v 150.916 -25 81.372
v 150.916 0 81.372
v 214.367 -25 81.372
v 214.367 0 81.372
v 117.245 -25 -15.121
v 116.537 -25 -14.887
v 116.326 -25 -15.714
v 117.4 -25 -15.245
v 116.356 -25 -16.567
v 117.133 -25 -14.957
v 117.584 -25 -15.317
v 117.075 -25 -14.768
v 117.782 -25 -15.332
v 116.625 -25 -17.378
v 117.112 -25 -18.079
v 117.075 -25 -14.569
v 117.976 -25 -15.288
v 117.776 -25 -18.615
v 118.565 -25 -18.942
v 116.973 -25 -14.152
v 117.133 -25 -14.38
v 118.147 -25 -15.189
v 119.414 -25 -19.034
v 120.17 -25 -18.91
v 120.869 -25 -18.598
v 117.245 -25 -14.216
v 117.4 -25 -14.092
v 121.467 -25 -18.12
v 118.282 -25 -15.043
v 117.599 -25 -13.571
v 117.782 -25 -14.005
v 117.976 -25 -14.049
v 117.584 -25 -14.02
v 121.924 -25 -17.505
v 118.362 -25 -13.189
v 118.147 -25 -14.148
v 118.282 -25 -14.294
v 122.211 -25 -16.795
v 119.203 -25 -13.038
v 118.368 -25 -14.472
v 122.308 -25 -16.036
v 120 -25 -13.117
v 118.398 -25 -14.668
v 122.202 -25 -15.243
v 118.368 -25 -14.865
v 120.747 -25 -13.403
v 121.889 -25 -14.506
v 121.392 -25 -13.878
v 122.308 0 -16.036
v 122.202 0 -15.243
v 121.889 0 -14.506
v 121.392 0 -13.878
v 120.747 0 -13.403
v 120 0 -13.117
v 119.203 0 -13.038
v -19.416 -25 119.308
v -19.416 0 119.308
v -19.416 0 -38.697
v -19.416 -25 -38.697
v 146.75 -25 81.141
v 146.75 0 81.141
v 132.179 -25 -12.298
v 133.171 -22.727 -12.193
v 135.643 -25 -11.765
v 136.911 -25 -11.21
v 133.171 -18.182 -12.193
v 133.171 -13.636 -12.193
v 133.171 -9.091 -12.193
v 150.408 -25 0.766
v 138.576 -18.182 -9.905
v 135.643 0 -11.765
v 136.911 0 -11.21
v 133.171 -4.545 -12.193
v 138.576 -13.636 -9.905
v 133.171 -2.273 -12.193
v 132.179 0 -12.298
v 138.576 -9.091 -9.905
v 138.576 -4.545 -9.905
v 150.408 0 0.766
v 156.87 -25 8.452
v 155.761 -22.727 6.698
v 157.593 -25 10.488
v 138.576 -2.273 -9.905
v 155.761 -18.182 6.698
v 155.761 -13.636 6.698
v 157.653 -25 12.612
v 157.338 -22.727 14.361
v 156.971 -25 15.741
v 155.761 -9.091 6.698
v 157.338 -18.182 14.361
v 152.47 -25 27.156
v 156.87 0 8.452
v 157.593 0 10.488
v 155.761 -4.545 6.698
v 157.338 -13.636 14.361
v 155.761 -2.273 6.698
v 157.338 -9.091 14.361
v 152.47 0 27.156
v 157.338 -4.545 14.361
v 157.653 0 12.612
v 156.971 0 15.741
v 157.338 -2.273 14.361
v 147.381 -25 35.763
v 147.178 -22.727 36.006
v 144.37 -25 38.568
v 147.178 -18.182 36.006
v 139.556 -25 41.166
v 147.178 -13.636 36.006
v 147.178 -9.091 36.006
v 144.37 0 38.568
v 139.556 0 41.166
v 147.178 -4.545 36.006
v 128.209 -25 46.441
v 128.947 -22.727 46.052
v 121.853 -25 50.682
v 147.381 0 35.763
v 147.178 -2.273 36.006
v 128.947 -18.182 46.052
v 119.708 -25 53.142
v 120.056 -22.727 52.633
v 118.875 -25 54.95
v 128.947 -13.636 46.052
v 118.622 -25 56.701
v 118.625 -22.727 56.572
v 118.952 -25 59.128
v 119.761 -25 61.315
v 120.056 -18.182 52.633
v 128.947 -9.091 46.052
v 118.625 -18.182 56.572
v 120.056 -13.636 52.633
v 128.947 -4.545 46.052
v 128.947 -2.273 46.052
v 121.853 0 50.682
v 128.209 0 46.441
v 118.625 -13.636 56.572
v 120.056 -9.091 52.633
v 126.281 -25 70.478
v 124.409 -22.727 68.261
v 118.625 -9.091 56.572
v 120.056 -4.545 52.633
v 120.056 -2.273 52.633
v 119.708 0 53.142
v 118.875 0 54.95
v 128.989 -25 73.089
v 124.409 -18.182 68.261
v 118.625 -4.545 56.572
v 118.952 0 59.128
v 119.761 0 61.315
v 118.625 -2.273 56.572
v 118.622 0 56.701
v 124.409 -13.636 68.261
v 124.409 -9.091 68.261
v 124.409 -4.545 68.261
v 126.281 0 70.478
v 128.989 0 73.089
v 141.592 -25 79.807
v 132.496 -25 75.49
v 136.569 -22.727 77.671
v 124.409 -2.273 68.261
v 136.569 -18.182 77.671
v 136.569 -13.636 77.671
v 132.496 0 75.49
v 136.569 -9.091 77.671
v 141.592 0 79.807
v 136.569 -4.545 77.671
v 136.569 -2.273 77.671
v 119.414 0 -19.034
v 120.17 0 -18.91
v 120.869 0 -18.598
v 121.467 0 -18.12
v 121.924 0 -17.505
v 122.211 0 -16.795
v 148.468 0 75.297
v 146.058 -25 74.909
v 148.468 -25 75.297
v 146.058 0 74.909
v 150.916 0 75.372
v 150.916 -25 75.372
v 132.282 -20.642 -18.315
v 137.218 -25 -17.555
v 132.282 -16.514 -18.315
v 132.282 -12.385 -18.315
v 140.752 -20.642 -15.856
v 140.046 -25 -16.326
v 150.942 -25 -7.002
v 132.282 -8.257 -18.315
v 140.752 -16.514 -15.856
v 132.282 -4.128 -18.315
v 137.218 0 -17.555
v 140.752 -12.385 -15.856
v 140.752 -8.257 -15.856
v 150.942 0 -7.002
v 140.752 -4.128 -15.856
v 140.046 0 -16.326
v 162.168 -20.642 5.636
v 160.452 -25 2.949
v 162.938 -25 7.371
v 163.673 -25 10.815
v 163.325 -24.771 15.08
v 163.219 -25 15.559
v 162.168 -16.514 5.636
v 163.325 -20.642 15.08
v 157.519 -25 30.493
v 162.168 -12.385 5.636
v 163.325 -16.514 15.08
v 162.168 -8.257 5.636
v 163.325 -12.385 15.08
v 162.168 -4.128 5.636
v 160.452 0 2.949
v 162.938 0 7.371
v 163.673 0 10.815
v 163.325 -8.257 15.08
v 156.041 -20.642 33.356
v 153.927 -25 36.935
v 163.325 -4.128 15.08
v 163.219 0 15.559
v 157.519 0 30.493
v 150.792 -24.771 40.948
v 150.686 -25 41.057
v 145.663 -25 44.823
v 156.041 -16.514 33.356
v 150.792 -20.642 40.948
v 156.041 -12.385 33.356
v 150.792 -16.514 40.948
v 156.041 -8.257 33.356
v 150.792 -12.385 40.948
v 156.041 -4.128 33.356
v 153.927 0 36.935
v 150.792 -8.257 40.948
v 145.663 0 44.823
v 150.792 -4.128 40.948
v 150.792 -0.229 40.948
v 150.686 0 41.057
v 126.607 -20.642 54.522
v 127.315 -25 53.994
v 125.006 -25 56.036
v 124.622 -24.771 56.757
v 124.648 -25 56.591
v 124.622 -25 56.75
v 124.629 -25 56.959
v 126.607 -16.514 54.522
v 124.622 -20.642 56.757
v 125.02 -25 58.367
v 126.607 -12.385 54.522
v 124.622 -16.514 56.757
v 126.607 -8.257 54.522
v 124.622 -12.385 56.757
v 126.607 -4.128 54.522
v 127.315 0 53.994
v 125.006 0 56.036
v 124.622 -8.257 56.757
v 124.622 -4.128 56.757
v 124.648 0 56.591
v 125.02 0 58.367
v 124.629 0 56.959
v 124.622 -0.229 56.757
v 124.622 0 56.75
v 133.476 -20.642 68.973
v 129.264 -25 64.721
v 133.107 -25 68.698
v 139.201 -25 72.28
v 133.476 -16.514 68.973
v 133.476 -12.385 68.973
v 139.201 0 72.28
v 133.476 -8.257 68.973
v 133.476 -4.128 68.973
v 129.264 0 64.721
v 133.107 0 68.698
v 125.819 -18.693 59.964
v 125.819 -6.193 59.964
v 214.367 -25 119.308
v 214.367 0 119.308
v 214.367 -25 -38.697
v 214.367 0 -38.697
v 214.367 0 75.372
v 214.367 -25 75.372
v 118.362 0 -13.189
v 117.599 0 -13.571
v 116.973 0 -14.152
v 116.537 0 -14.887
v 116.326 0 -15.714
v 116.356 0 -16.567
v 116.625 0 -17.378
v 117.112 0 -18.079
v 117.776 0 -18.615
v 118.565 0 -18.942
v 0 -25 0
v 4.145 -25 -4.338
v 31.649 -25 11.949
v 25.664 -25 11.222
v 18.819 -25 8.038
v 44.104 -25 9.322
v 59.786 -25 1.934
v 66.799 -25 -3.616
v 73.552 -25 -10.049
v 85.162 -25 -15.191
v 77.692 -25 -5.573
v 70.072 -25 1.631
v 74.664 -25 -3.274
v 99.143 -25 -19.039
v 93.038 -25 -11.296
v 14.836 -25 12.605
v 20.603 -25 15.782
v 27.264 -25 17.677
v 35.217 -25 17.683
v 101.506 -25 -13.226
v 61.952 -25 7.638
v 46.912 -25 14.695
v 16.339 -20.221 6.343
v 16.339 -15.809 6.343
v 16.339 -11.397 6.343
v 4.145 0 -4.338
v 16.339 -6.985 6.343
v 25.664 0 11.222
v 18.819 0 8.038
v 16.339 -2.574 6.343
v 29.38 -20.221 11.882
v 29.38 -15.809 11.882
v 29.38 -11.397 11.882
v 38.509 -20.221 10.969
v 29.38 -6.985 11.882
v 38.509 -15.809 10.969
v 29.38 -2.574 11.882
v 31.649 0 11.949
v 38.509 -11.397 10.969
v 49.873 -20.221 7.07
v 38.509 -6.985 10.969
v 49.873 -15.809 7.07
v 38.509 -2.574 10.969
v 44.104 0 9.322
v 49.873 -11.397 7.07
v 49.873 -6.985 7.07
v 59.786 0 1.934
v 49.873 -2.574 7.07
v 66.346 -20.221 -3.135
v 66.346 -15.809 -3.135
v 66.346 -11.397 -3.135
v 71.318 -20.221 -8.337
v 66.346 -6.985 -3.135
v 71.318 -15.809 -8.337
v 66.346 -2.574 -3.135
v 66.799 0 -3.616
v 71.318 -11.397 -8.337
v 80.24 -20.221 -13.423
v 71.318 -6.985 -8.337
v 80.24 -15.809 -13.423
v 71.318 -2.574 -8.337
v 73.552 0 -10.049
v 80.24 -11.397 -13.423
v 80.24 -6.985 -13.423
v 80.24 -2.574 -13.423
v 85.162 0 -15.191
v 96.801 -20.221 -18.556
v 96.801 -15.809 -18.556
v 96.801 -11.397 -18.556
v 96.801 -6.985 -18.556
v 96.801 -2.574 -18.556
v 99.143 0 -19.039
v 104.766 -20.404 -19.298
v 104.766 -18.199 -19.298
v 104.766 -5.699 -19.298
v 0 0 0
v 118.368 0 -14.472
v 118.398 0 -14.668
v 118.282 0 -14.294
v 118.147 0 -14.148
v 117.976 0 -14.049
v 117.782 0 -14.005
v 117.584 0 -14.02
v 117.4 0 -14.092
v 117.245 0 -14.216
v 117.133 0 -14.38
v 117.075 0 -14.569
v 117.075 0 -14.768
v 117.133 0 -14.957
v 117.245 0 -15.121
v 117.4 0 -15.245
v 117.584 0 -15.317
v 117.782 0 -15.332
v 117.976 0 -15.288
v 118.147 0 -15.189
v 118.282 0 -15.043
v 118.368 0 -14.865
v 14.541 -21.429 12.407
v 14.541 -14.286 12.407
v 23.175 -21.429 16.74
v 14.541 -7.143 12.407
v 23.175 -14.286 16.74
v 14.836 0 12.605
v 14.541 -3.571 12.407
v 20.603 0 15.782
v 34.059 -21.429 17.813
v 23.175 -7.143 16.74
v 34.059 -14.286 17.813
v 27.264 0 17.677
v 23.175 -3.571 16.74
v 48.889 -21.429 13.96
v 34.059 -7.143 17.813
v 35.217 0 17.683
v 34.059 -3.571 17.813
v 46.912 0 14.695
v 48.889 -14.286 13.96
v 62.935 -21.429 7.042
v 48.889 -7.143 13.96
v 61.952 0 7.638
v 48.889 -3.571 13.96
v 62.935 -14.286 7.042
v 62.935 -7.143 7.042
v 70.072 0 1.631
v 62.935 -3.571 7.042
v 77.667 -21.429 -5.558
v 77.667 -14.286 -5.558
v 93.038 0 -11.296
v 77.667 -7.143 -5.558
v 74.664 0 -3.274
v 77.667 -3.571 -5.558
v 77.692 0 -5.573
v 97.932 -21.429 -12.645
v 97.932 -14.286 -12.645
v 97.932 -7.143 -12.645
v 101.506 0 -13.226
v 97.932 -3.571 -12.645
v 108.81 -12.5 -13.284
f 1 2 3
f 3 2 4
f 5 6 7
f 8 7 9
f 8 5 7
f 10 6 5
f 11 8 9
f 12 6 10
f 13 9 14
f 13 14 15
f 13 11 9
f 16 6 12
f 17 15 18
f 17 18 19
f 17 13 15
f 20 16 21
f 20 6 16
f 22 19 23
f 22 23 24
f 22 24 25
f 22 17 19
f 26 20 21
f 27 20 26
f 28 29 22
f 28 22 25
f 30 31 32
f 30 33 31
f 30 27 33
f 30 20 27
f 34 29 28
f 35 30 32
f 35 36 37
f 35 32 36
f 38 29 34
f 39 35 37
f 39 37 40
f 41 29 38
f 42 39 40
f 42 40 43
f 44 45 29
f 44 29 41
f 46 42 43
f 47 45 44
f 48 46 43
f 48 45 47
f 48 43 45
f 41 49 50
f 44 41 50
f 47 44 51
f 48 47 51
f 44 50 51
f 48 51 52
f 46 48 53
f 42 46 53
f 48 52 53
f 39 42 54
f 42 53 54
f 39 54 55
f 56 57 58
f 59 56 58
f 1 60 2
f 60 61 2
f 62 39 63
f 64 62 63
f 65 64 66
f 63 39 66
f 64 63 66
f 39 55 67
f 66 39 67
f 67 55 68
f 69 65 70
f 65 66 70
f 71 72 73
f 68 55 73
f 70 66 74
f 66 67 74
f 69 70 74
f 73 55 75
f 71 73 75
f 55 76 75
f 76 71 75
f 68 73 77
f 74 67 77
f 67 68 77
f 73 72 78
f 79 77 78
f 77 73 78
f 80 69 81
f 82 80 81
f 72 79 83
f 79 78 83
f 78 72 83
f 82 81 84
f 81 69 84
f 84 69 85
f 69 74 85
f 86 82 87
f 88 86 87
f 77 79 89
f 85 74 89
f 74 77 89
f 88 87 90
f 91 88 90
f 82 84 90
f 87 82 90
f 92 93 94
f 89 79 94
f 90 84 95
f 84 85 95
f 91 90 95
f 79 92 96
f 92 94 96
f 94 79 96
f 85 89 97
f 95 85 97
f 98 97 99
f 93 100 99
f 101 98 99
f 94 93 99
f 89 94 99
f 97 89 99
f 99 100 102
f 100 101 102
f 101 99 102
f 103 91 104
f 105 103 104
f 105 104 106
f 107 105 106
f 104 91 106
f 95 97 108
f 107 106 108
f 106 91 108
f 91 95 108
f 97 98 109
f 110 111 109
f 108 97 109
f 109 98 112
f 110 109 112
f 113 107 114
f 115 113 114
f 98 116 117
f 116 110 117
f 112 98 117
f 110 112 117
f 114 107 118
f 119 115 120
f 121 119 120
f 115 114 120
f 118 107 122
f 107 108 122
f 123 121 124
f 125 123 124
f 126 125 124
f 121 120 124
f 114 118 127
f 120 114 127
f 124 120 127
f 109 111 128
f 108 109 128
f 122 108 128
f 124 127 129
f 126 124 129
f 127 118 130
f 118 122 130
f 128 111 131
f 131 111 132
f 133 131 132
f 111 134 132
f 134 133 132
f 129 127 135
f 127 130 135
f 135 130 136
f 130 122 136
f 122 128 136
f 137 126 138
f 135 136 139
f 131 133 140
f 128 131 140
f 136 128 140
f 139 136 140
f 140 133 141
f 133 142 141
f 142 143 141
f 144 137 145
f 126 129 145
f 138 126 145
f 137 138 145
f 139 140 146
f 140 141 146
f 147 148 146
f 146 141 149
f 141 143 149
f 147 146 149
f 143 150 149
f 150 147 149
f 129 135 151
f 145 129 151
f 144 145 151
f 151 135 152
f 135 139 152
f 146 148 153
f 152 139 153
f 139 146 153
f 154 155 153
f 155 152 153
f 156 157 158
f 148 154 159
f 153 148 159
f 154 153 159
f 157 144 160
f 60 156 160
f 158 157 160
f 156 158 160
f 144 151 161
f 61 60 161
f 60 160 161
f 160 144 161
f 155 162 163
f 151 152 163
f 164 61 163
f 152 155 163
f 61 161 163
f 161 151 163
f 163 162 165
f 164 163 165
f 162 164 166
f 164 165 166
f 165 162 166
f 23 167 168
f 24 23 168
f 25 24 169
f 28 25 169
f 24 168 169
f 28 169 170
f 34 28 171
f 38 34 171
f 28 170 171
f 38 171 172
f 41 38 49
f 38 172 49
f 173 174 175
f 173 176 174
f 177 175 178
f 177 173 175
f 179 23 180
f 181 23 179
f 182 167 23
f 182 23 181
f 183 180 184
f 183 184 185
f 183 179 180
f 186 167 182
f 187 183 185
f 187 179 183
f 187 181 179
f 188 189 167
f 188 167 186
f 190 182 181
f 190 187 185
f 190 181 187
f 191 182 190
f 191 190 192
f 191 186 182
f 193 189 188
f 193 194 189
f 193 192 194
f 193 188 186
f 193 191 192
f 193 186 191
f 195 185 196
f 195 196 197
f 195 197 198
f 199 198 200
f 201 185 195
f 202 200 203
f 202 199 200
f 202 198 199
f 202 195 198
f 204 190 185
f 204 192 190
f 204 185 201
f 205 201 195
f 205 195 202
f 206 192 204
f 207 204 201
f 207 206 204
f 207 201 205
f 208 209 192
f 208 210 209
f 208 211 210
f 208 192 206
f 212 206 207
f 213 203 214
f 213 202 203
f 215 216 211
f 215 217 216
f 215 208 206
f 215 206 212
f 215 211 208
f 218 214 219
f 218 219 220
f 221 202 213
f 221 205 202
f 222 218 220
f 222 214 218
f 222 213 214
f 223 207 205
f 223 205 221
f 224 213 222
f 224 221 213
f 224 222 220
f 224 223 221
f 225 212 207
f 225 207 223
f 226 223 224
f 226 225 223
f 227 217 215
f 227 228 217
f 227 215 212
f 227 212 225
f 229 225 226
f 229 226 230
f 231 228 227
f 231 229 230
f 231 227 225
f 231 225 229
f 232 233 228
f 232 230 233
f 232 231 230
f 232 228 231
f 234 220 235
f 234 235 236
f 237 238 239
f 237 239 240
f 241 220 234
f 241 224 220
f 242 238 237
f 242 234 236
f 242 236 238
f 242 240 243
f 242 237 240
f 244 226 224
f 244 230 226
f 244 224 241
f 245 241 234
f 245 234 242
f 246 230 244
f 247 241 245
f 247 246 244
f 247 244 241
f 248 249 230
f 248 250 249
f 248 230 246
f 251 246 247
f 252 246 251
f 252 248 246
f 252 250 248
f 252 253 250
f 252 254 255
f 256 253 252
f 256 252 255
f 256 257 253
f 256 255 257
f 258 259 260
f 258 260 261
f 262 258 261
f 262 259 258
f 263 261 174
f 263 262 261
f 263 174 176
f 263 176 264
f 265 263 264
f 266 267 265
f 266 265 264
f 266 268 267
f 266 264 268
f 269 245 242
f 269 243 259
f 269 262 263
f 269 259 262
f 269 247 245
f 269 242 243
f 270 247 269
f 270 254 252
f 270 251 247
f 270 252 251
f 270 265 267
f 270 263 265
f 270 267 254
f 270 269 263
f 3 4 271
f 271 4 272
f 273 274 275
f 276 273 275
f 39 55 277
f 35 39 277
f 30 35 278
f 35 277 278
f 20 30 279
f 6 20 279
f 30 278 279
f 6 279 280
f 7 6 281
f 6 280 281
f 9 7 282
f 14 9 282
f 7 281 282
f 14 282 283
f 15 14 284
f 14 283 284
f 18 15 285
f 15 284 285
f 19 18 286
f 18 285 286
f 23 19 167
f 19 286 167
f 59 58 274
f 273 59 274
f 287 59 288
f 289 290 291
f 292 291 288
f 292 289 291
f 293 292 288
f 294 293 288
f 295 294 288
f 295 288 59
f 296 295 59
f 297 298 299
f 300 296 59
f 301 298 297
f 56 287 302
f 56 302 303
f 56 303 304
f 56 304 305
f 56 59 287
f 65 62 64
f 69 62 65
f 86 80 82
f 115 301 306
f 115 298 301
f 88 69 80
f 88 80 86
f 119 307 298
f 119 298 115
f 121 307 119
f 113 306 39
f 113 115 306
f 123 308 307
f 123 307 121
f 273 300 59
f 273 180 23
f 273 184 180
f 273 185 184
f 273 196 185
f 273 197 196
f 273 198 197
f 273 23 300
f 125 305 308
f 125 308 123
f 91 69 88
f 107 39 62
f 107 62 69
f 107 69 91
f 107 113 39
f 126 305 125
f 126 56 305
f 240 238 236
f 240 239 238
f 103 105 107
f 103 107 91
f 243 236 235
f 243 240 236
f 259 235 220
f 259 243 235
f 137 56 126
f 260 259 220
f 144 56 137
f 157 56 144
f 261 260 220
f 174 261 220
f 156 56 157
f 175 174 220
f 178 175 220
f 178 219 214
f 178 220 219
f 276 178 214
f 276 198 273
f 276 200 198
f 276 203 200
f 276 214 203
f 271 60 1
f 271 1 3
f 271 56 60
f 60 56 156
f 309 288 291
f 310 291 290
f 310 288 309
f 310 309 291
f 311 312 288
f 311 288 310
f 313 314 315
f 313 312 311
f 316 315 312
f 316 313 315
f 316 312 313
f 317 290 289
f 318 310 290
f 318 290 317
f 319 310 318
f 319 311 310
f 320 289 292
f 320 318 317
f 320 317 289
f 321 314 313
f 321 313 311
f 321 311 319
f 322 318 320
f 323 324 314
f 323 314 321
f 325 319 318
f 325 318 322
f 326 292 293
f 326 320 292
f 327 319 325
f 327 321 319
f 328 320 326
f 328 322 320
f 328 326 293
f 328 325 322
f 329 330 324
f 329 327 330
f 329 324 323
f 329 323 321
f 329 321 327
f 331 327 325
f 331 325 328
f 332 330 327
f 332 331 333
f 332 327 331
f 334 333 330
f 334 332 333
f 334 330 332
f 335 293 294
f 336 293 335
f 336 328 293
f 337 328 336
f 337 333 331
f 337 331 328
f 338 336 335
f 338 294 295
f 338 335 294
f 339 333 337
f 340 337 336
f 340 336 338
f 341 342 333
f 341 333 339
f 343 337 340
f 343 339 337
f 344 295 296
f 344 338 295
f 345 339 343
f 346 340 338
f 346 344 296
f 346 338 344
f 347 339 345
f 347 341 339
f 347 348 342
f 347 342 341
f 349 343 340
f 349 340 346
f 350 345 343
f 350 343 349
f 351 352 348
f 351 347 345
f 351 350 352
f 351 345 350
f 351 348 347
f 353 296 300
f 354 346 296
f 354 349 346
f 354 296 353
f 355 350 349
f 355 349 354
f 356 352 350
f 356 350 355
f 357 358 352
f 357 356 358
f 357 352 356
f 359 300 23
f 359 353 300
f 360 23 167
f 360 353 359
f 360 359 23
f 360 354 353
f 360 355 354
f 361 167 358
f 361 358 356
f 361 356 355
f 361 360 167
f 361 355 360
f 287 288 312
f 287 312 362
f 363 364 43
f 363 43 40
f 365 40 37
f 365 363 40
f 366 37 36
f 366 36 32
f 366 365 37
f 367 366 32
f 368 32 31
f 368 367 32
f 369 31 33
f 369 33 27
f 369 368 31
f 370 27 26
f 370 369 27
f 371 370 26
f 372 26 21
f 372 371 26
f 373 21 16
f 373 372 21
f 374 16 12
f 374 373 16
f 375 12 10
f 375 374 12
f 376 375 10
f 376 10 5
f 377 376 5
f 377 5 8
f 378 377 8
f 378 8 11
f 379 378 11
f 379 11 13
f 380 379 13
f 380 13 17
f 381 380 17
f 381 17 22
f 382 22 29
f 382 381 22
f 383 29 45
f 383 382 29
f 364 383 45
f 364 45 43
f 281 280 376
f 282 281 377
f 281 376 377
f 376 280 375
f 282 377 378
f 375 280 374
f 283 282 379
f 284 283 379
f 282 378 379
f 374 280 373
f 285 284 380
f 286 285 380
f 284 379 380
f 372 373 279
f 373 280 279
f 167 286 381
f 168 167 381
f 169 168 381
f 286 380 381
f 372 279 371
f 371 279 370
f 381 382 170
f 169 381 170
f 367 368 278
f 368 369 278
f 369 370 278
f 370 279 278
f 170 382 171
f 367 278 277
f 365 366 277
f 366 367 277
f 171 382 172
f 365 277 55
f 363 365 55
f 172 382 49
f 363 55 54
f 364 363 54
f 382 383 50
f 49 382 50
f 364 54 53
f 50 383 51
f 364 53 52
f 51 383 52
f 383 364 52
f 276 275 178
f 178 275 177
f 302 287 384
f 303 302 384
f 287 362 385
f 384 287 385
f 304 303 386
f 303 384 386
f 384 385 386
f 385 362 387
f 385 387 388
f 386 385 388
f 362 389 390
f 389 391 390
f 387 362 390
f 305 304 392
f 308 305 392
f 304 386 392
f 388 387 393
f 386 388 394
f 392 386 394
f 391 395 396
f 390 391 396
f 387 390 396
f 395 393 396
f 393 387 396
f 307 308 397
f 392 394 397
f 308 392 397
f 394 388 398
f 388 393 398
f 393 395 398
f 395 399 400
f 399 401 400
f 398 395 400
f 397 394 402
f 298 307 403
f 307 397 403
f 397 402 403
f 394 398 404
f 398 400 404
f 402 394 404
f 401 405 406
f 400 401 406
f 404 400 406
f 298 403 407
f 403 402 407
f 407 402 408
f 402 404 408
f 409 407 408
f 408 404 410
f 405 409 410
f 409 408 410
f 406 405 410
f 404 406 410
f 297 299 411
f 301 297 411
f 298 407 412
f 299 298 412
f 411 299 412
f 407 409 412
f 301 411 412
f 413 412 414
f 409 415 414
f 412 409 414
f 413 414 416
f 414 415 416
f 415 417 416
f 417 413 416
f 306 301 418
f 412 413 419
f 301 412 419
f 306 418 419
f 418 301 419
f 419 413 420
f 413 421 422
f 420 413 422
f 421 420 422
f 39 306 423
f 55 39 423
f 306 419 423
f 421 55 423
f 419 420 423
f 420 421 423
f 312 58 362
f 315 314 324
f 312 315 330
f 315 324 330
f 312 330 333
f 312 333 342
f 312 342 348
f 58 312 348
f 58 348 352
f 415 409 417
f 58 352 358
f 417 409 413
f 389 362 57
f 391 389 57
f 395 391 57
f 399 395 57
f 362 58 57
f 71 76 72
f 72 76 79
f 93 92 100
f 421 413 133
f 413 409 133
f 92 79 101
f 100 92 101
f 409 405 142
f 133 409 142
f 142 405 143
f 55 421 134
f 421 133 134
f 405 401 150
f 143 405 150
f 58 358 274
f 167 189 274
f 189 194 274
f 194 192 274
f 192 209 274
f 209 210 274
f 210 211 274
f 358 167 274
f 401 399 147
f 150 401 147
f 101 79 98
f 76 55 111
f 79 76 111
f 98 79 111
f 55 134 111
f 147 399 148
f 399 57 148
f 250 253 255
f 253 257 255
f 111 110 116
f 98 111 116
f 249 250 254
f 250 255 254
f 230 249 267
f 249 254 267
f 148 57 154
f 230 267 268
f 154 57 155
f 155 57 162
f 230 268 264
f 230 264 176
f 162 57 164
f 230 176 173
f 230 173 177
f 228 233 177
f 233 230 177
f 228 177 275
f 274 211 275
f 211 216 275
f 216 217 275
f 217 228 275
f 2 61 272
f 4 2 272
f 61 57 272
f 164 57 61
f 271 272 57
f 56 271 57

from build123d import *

# Parameters (mm, degrees)
F0_R     = 0.6651863413
F1_DEPTH = 25
F2_DEPTH = 25


# Not quite as in the source:
# - the dataset's text gives a spline's control points without its knots; the knots are read off the source's solid


with BuildPart() as f1:
    # F0 (on Front) → F1 (new body)
    with BuildSketch(Plane.XZ):
        with BuildLine():
            ThreePointArc((122.3084832169, -16.0360134831), (121.3921244993, -13.8776717571), (119.2028572127, -13.0378735352))
            ThreePointArc((119.2028572127, -13.0378735352), (116.3103432648, -16.1416393675), (119.4141089815, -19.0341534395))
            ThreePointArc((119.4141089815, -19.0341534395), (121.4668248597, -18.1196548518), (122.3084832169, -16.0360134831))
        make_face()
        with Locations((117.7324801683, -14.6684795618)):
            Circle(F0_R, mode=Mode.SUBTRACT)
    extrude(amount=F1_DEPTH)


with BuildPart() as f2:
    # F0 (on Front) → F2 (new body)
    with BuildSketch(Plane.XZ):
        with BuildLine():
            Line((4.1454933636, -4.3376127965), (0, 0))
            add(Edge.make_bspline(
                [(0, 0), (4.5037117249, 4.3042355191), (13.7648963192, 13.1552282369), (33.6539795611, 22.3859469816), (70.5260974638, 4.6908661854), (74.9131356895, -6.6840442171), (98.0696827717, -12.5601876128), (100.2690851646, -13.4345128534), (112.4963916518, -13.2741456838), (119.2028572127, -13.0378735352)],
                knots=[0, 0, 0, 0, 0.0640752575, 0.1317608283, 0.2223436266, 0.275722026, 0.3430860694, 0.3769734154, 0.4213979277, 0.4213979277, 0.4213979277, 0.4213979277], degree=3))
            add(Edge.make_bspline(
                [(119.2028572127, -13.0378735352), (125.1175905208, -12.8294945114), (135.8875979213, -12.2260329219), (137.8490544226, -10.5135173732), (157.7784624841, 6.5110943868), (158.2406973488, 14.6134364576), (149.0449665664, 35.7990843084), (140.9804715168, 41.1596578372), (111.9921272876, 52.0827318338), (124.762690675, 68.9964906206), (130.0986463551, 74.7437775542), (143.629972816, 81.2356032201), (148.7753786698, 81.3720077442), (150.9158611298, 81.3720077442)],
                knots=[0.4213979277, 0.4213979277, 0.4213979277, 0.4213979277, 0.4605779012, 0.4949630674, 0.5674303222, 0.6104638131, 0.6784317625, 0.7289830889, 0.802541483, 0.8595384058, 0.9042921665, 0.9601939233, 1, 1, 1, 1], degree=3))
            Line((150.9158611298, 81.3720077442), (214.3666487599, 81.3720077442))
            Line((214.3666487599, 81.3720077442), (214.3666487599, 119.3081084329))
            Line((214.3666487599, 119.3081084329), (-19.4157916641, 119.3081084329))
            Line((-19.4157916641, 119.3081084329), (-19.4157916641, -38.6965889793))
            Line((-19.4157916641, -38.6965889793), (214.3666487599, -38.6965889793))
            Line((214.3666487599, -38.6965889793), (214.3666487599, 75.3720077442))
            Line((214.3666487599, 75.3720077442), (150.9158611298, 75.3720077442))
            add(Edge.make_bspline(
                [(119.4141089799, -19.0341533954), (119.4871101516, -19.0315815327), (120.7551628168, -18.9865960674), (123.2020002243, -18.8892209022), (126.6016258276, -18.721466052), (129.2051336824, -18.5607598165), (131.0997995453, -18.4191431049), (132.4164773871, -18.3058518725), (133.6240077571, -18.1839174375), (134.7173448038, -18.0511427938), (135.7389696275, -17.895900431), (136.7669974316, -17.6868852154), (137.8404453509, -17.3829180115), (138.9380310563, -16.9476296867), (139.9625613283, -16.3985584776), (140.827052172, -15.8155520494), (141.5322803356, -15.2650586357), (142.0407792766, -14.8375029591), (142.438270563, -14.4972905878), (142.8420836155, -14.1508828396), (143.4192170697, -13.6561238308), (144.2024620522, -12.9826805066), (145.0673181917, -12.2355593157), (146.0013266265, -11.4235107422), (147.3241496876, -10.264303774), (149.0949763641, -8.691161638), (152.0635187163, -5.9867519033), (155.0634175663, -3.1175042059), (157.7826477848, -0.2711852119), (159.6172871117, 1.82988094), (160.9426876994, 3.578092876), (161.864848372, 5.0497093246), (162.4790539519, 6.2170852342), (162.9955971863, 7.4607803665), (163.386908628, 8.7726369645), (163.6303999393, 10.1189016964), (163.7228618743, 11.4518844469), (163.6835814445, 12.7316548024), (163.5436641961, 13.9413942325), (163.3329510954, 15.0871340521), (163.1161576384, 16.0068254114), (162.9252065829, 16.7332056778), (162.7195664026, 17.4716247723), (162.4360551739, 18.4166894366), (162.0561419501, 19.5870161779), (161.5002405625, 21.1918771935), (160.7196210908, 23.2706662014), (159.6681934008, 25.8342458833), (158.5248729578, 28.4116494335), (157.3114889212, 30.9458554347), (156.0475232975, 33.3808697793), (154.7457132627, 35.6668674836), (153.4085117355, 37.7623461903), (151.991662503, 39.6641433162), (150.4099177475, 41.3968167785), (148.6511497108, 42.9200771006), (146.7698746062, 44.209111144), (144.8048090764, 45.3123675275), (142.7267705238, 46.3246869099), (140.438462858, 47.3506114125), (137.9747297964, 48.4280612839), (135.4217548209, 49.5672266744), (132.8801749016, 50.7671681076), (130.464059114, 52.0169199809), (128.298049606, 53.2916050203), (126.8152096984, 54.3341822007), (125.8926787851, 55.1057116143), (125.3481084384, 55.6317010892), (124.9614837204, 56.0779002187), (124.7324111989, 56.4110817064), (124.6642598762, 56.5496236369), (124.6469062848, 56.5919977881), (124.6423285594, 56.604558201), (124.6369168484, 56.6223618588), (124.6254672346, 56.6740931465), (124.6168148585, 56.8309541668), (124.6407980996, 57.1110436646), (124.7506534781, 57.6487861525), (125.0802050729, 58.5920803636), (125.8005058034, 59.9854736022), (126.6083870109, 61.2414798545), (127.3291502197, 62.2518120274), (127.8938491077, 63.0028563289), (128.3742714561, 63.6166989958), (128.7582219627, 64.0971795957), (129.0458019743, 64.453161697), (129.3271818406, 64.7988859857), (129.6843642656, 65.2337517538), (130.1035993611, 65.735320869), (130.567326874, 66.2726212921), (131.1425124055, 66.9119050208), (131.7987212915, 67.5854626234), (132.5697497197, 68.2809981123), (133.2950551065, 68.8495639596), (133.9827804314, 69.3348396315), (134.7613012396, 69.8504399686), (135.9102342215, 70.5510874997), (137.4767302693, 71.4187773785), (139.1589871979, 72.2716649361), (140.8857983187, 73.0714834042), (142.302594056, 73.6643488492), (143.3840824883, 74.0773252687), (144.1577631499, 74.3520546179), (144.8839306759, 74.5882634106), (145.540971774, 74.7798881974), (146.1432863223, 74.9327931307), (146.8962108192, 75.095777904), (147.758617804, 75.2335789325), (148.7467949394, 75.3262316993), (149.7679595331, 75.3675621745), (150.5165689591, 75.3720077442), (150.9158611298, 75.3720077442)],
                knots=[0.4213979254, 0.4213979254, 0.4213979254, 0.4213979254, 0.421875, 0.4296875, 0.4375, 0.4453125, 0.44921875, 0.453125, 0.45703125, 0.4609375, 0.46484375, 0.46875, 0.47265625, 0.4765625, 0.48046875, 0.484375, 0.48828125, 0.4921875, 0.494140625, 0.49609375, 0.5, 0.50390625, 0.5078125, 0.51171875, 0.515625, 0.5234375, 0.53125, 0.546875, 0.5546875, 0.5625, 0.5703125, 0.57421875, 0.578125, 0.58203125, 0.5859375, 0.58984375, 0.59375, 0.59765625, 0.6015625, 0.60546875, 0.609375, 0.611328125, 0.61328125, 0.6171875, 0.62109375, 0.625, 0.6328125, 0.640625, 0.6484375, 0.65625, 0.6640625, 0.671875, 0.6796875, 0.6875, 0.6953125, 0.703125, 0.7109375, 0.71875, 0.7265625, 0.734375, 0.7421875, 0.75, 0.7578125, 0.765625, 0.7734375, 0.78125, 0.78515625, 0.7890625, 0.79296875, 0.796875, 0.80078125, 0.8017578125, 0.802734375, 0.8046875, 0.80859375, 0.8125, 0.81640625, 0.8203125, 0.828125, 0.8359375, 0.84375, 0.84765625, 0.8515625, 0.85546875, 0.857421875, 0.859375, 0.861328125, 0.86328125, 0.8671875, 0.87109375, 0.875, 0.8828125, 0.890625, 0.8984375, 0.90234375, 0.90625, 0.9140625, 0.921875, 0.9296875, 0.9375, 0.9453125, 0.94921875, 0.953125, 0.95703125, 0.9609375, 0.96484375, 0.96875, 0.9765625, 0.984375, 0.9921875, 1, 1, 1, 1], degree=3))
            add(Edge.make_bspline(
                [(4.1454933636, -4.3376127965), (5.2437409318, -3.2880082746), (7.4130473658, -1.2150332588), (10.6346217395, 1.7479905226), (13.328983039, 4.0421704542), (15.5108600534, 5.7442358048), (16.8897277858, 6.7471664464), (18.0048744149, 7.5105836164), (19.1135300455, 8.2350503066), (20.4954893224, 9.0654553771), (22.1600034365, 9.9291412323), (24.4128030564, 10.8930416102), (26.7617592156, 11.5664937426), (29.3526802049, 11.9125235338), (31.1092438153, 11.9747900048), (32.6185135441, 11.9179799387), (33.8026291591, 11.8180300331), (35.0658605885, 11.6547378195), (36.8424919842, 11.3539219674), (39.2074188038, 10.826783948), (42.1971171925, 9.9757162304), (45.2681150661, 8.9351274998), (49.3842856633, 7.3371678916), (53.4085483139, 5.4889718545), (57.099619297, 3.5320540573), (59.640004233, 2.0493646835), (61.5133475968, 0.8375436531), (62.8304971794, -0.0906884738), (63.5694491508, -0.6461378338), (64.1054790166, -1.0710734595), (64.4763479102, -1.3766847661), (64.8238613096, -1.6750569086), (65.4841566064, -2.2649459105), (66.359173463, -3.1275277083), (67.4495081459, -4.3249654744), (68.617227829, -5.6566289331), (70.0028678673, -7.1492026464), (71.4329639416, -8.4709854063), (72.7695929433, -9.5133625191), (73.8665488203, -10.2728637672), (75.0695535726, -11.004284465), (76.3089036908, -11.6706590346), (77.586262972, -12.2918209894), (79.3342523936, -13.0700358574), (81.5896831926, -13.9645213472), (84.3430443861, -14.9339157819), (87.061245605, -15.8048884282), (89.6534851435, -16.5766586066), (91.6276841961, -17.1333894197), (93.0427049791, -17.5231249068), (94.0074769688, -17.7862802292), (94.7170841431, -17.9796187266), (95.2200929153, -18.1177136158), (95.5577608478, -18.2113357528), (95.8758779604, -18.3005162078), (96.2867325524, -18.4158262689), (96.7936336212, -18.5562645933), (97.4461681933, -18.7240555173), (98.1680763275, -18.8831391308), (98.945808312, -19.0171782937), (99.7534121549, -19.1172310279), (100.5883223202, -19.186811534), (101.4764122205, -19.2341514561), (102.464072553, -19.2665411051), (103.9552517431, -19.2951732767), (106.1316755542, -19.3064098066), (109.1626871747, -19.2848806165), (112.5021370915, -19.2305099516), (115.9623834061, -19.1470091318), (118.2916543284, -19.0736979571), (119.4141089799, -19.0341533954)],
                knots=[0, 0, 0, 0, 0.015625, 0.03125, 0.046875, 0.0546875, 0.0625, 0.06640625, 0.0703125, 0.078125, 0.0859375, 0.09375, 0.109375, 0.1171875, 0.125, 0.12890625, 0.1328125, 0.13671875, 0.140625, 0.1484375, 0.15625, 0.1640625, 0.171875, 0.1875, 0.1953125, 0.203125, 0.2109375, 0.21484375, 0.21875, 0.220703125, 0.22265625, 0.224609375, 0.2265625, 0.234375, 0.2421875, 0.25, 0.2578125, 0.265625, 0.26953125, 0.2734375, 0.27734375, 0.28125, 0.28515625, 0.2890625, 0.296875, 0.3046875, 0.3125, 0.3203125, 0.328125, 0.33203125, 0.3359375, 0.33984375, 0.341796875, 0.34375, 0.345703125, 0.34765625, 0.3515625, 0.35546875, 0.359375, 0.36328125, 0.3671875, 0.37109375, 0.375, 0.37890625, 0.3828125, 0.390625, 0.3984375, 0.40625, 0.4140625, 0.4213979254, 0.4213979254, 0.4213979254, 0.4213979254], degree=3))
        make_face()
    extrude(amount=F2_DEPTH)


solid = Compound([f1.part, f2.part])
